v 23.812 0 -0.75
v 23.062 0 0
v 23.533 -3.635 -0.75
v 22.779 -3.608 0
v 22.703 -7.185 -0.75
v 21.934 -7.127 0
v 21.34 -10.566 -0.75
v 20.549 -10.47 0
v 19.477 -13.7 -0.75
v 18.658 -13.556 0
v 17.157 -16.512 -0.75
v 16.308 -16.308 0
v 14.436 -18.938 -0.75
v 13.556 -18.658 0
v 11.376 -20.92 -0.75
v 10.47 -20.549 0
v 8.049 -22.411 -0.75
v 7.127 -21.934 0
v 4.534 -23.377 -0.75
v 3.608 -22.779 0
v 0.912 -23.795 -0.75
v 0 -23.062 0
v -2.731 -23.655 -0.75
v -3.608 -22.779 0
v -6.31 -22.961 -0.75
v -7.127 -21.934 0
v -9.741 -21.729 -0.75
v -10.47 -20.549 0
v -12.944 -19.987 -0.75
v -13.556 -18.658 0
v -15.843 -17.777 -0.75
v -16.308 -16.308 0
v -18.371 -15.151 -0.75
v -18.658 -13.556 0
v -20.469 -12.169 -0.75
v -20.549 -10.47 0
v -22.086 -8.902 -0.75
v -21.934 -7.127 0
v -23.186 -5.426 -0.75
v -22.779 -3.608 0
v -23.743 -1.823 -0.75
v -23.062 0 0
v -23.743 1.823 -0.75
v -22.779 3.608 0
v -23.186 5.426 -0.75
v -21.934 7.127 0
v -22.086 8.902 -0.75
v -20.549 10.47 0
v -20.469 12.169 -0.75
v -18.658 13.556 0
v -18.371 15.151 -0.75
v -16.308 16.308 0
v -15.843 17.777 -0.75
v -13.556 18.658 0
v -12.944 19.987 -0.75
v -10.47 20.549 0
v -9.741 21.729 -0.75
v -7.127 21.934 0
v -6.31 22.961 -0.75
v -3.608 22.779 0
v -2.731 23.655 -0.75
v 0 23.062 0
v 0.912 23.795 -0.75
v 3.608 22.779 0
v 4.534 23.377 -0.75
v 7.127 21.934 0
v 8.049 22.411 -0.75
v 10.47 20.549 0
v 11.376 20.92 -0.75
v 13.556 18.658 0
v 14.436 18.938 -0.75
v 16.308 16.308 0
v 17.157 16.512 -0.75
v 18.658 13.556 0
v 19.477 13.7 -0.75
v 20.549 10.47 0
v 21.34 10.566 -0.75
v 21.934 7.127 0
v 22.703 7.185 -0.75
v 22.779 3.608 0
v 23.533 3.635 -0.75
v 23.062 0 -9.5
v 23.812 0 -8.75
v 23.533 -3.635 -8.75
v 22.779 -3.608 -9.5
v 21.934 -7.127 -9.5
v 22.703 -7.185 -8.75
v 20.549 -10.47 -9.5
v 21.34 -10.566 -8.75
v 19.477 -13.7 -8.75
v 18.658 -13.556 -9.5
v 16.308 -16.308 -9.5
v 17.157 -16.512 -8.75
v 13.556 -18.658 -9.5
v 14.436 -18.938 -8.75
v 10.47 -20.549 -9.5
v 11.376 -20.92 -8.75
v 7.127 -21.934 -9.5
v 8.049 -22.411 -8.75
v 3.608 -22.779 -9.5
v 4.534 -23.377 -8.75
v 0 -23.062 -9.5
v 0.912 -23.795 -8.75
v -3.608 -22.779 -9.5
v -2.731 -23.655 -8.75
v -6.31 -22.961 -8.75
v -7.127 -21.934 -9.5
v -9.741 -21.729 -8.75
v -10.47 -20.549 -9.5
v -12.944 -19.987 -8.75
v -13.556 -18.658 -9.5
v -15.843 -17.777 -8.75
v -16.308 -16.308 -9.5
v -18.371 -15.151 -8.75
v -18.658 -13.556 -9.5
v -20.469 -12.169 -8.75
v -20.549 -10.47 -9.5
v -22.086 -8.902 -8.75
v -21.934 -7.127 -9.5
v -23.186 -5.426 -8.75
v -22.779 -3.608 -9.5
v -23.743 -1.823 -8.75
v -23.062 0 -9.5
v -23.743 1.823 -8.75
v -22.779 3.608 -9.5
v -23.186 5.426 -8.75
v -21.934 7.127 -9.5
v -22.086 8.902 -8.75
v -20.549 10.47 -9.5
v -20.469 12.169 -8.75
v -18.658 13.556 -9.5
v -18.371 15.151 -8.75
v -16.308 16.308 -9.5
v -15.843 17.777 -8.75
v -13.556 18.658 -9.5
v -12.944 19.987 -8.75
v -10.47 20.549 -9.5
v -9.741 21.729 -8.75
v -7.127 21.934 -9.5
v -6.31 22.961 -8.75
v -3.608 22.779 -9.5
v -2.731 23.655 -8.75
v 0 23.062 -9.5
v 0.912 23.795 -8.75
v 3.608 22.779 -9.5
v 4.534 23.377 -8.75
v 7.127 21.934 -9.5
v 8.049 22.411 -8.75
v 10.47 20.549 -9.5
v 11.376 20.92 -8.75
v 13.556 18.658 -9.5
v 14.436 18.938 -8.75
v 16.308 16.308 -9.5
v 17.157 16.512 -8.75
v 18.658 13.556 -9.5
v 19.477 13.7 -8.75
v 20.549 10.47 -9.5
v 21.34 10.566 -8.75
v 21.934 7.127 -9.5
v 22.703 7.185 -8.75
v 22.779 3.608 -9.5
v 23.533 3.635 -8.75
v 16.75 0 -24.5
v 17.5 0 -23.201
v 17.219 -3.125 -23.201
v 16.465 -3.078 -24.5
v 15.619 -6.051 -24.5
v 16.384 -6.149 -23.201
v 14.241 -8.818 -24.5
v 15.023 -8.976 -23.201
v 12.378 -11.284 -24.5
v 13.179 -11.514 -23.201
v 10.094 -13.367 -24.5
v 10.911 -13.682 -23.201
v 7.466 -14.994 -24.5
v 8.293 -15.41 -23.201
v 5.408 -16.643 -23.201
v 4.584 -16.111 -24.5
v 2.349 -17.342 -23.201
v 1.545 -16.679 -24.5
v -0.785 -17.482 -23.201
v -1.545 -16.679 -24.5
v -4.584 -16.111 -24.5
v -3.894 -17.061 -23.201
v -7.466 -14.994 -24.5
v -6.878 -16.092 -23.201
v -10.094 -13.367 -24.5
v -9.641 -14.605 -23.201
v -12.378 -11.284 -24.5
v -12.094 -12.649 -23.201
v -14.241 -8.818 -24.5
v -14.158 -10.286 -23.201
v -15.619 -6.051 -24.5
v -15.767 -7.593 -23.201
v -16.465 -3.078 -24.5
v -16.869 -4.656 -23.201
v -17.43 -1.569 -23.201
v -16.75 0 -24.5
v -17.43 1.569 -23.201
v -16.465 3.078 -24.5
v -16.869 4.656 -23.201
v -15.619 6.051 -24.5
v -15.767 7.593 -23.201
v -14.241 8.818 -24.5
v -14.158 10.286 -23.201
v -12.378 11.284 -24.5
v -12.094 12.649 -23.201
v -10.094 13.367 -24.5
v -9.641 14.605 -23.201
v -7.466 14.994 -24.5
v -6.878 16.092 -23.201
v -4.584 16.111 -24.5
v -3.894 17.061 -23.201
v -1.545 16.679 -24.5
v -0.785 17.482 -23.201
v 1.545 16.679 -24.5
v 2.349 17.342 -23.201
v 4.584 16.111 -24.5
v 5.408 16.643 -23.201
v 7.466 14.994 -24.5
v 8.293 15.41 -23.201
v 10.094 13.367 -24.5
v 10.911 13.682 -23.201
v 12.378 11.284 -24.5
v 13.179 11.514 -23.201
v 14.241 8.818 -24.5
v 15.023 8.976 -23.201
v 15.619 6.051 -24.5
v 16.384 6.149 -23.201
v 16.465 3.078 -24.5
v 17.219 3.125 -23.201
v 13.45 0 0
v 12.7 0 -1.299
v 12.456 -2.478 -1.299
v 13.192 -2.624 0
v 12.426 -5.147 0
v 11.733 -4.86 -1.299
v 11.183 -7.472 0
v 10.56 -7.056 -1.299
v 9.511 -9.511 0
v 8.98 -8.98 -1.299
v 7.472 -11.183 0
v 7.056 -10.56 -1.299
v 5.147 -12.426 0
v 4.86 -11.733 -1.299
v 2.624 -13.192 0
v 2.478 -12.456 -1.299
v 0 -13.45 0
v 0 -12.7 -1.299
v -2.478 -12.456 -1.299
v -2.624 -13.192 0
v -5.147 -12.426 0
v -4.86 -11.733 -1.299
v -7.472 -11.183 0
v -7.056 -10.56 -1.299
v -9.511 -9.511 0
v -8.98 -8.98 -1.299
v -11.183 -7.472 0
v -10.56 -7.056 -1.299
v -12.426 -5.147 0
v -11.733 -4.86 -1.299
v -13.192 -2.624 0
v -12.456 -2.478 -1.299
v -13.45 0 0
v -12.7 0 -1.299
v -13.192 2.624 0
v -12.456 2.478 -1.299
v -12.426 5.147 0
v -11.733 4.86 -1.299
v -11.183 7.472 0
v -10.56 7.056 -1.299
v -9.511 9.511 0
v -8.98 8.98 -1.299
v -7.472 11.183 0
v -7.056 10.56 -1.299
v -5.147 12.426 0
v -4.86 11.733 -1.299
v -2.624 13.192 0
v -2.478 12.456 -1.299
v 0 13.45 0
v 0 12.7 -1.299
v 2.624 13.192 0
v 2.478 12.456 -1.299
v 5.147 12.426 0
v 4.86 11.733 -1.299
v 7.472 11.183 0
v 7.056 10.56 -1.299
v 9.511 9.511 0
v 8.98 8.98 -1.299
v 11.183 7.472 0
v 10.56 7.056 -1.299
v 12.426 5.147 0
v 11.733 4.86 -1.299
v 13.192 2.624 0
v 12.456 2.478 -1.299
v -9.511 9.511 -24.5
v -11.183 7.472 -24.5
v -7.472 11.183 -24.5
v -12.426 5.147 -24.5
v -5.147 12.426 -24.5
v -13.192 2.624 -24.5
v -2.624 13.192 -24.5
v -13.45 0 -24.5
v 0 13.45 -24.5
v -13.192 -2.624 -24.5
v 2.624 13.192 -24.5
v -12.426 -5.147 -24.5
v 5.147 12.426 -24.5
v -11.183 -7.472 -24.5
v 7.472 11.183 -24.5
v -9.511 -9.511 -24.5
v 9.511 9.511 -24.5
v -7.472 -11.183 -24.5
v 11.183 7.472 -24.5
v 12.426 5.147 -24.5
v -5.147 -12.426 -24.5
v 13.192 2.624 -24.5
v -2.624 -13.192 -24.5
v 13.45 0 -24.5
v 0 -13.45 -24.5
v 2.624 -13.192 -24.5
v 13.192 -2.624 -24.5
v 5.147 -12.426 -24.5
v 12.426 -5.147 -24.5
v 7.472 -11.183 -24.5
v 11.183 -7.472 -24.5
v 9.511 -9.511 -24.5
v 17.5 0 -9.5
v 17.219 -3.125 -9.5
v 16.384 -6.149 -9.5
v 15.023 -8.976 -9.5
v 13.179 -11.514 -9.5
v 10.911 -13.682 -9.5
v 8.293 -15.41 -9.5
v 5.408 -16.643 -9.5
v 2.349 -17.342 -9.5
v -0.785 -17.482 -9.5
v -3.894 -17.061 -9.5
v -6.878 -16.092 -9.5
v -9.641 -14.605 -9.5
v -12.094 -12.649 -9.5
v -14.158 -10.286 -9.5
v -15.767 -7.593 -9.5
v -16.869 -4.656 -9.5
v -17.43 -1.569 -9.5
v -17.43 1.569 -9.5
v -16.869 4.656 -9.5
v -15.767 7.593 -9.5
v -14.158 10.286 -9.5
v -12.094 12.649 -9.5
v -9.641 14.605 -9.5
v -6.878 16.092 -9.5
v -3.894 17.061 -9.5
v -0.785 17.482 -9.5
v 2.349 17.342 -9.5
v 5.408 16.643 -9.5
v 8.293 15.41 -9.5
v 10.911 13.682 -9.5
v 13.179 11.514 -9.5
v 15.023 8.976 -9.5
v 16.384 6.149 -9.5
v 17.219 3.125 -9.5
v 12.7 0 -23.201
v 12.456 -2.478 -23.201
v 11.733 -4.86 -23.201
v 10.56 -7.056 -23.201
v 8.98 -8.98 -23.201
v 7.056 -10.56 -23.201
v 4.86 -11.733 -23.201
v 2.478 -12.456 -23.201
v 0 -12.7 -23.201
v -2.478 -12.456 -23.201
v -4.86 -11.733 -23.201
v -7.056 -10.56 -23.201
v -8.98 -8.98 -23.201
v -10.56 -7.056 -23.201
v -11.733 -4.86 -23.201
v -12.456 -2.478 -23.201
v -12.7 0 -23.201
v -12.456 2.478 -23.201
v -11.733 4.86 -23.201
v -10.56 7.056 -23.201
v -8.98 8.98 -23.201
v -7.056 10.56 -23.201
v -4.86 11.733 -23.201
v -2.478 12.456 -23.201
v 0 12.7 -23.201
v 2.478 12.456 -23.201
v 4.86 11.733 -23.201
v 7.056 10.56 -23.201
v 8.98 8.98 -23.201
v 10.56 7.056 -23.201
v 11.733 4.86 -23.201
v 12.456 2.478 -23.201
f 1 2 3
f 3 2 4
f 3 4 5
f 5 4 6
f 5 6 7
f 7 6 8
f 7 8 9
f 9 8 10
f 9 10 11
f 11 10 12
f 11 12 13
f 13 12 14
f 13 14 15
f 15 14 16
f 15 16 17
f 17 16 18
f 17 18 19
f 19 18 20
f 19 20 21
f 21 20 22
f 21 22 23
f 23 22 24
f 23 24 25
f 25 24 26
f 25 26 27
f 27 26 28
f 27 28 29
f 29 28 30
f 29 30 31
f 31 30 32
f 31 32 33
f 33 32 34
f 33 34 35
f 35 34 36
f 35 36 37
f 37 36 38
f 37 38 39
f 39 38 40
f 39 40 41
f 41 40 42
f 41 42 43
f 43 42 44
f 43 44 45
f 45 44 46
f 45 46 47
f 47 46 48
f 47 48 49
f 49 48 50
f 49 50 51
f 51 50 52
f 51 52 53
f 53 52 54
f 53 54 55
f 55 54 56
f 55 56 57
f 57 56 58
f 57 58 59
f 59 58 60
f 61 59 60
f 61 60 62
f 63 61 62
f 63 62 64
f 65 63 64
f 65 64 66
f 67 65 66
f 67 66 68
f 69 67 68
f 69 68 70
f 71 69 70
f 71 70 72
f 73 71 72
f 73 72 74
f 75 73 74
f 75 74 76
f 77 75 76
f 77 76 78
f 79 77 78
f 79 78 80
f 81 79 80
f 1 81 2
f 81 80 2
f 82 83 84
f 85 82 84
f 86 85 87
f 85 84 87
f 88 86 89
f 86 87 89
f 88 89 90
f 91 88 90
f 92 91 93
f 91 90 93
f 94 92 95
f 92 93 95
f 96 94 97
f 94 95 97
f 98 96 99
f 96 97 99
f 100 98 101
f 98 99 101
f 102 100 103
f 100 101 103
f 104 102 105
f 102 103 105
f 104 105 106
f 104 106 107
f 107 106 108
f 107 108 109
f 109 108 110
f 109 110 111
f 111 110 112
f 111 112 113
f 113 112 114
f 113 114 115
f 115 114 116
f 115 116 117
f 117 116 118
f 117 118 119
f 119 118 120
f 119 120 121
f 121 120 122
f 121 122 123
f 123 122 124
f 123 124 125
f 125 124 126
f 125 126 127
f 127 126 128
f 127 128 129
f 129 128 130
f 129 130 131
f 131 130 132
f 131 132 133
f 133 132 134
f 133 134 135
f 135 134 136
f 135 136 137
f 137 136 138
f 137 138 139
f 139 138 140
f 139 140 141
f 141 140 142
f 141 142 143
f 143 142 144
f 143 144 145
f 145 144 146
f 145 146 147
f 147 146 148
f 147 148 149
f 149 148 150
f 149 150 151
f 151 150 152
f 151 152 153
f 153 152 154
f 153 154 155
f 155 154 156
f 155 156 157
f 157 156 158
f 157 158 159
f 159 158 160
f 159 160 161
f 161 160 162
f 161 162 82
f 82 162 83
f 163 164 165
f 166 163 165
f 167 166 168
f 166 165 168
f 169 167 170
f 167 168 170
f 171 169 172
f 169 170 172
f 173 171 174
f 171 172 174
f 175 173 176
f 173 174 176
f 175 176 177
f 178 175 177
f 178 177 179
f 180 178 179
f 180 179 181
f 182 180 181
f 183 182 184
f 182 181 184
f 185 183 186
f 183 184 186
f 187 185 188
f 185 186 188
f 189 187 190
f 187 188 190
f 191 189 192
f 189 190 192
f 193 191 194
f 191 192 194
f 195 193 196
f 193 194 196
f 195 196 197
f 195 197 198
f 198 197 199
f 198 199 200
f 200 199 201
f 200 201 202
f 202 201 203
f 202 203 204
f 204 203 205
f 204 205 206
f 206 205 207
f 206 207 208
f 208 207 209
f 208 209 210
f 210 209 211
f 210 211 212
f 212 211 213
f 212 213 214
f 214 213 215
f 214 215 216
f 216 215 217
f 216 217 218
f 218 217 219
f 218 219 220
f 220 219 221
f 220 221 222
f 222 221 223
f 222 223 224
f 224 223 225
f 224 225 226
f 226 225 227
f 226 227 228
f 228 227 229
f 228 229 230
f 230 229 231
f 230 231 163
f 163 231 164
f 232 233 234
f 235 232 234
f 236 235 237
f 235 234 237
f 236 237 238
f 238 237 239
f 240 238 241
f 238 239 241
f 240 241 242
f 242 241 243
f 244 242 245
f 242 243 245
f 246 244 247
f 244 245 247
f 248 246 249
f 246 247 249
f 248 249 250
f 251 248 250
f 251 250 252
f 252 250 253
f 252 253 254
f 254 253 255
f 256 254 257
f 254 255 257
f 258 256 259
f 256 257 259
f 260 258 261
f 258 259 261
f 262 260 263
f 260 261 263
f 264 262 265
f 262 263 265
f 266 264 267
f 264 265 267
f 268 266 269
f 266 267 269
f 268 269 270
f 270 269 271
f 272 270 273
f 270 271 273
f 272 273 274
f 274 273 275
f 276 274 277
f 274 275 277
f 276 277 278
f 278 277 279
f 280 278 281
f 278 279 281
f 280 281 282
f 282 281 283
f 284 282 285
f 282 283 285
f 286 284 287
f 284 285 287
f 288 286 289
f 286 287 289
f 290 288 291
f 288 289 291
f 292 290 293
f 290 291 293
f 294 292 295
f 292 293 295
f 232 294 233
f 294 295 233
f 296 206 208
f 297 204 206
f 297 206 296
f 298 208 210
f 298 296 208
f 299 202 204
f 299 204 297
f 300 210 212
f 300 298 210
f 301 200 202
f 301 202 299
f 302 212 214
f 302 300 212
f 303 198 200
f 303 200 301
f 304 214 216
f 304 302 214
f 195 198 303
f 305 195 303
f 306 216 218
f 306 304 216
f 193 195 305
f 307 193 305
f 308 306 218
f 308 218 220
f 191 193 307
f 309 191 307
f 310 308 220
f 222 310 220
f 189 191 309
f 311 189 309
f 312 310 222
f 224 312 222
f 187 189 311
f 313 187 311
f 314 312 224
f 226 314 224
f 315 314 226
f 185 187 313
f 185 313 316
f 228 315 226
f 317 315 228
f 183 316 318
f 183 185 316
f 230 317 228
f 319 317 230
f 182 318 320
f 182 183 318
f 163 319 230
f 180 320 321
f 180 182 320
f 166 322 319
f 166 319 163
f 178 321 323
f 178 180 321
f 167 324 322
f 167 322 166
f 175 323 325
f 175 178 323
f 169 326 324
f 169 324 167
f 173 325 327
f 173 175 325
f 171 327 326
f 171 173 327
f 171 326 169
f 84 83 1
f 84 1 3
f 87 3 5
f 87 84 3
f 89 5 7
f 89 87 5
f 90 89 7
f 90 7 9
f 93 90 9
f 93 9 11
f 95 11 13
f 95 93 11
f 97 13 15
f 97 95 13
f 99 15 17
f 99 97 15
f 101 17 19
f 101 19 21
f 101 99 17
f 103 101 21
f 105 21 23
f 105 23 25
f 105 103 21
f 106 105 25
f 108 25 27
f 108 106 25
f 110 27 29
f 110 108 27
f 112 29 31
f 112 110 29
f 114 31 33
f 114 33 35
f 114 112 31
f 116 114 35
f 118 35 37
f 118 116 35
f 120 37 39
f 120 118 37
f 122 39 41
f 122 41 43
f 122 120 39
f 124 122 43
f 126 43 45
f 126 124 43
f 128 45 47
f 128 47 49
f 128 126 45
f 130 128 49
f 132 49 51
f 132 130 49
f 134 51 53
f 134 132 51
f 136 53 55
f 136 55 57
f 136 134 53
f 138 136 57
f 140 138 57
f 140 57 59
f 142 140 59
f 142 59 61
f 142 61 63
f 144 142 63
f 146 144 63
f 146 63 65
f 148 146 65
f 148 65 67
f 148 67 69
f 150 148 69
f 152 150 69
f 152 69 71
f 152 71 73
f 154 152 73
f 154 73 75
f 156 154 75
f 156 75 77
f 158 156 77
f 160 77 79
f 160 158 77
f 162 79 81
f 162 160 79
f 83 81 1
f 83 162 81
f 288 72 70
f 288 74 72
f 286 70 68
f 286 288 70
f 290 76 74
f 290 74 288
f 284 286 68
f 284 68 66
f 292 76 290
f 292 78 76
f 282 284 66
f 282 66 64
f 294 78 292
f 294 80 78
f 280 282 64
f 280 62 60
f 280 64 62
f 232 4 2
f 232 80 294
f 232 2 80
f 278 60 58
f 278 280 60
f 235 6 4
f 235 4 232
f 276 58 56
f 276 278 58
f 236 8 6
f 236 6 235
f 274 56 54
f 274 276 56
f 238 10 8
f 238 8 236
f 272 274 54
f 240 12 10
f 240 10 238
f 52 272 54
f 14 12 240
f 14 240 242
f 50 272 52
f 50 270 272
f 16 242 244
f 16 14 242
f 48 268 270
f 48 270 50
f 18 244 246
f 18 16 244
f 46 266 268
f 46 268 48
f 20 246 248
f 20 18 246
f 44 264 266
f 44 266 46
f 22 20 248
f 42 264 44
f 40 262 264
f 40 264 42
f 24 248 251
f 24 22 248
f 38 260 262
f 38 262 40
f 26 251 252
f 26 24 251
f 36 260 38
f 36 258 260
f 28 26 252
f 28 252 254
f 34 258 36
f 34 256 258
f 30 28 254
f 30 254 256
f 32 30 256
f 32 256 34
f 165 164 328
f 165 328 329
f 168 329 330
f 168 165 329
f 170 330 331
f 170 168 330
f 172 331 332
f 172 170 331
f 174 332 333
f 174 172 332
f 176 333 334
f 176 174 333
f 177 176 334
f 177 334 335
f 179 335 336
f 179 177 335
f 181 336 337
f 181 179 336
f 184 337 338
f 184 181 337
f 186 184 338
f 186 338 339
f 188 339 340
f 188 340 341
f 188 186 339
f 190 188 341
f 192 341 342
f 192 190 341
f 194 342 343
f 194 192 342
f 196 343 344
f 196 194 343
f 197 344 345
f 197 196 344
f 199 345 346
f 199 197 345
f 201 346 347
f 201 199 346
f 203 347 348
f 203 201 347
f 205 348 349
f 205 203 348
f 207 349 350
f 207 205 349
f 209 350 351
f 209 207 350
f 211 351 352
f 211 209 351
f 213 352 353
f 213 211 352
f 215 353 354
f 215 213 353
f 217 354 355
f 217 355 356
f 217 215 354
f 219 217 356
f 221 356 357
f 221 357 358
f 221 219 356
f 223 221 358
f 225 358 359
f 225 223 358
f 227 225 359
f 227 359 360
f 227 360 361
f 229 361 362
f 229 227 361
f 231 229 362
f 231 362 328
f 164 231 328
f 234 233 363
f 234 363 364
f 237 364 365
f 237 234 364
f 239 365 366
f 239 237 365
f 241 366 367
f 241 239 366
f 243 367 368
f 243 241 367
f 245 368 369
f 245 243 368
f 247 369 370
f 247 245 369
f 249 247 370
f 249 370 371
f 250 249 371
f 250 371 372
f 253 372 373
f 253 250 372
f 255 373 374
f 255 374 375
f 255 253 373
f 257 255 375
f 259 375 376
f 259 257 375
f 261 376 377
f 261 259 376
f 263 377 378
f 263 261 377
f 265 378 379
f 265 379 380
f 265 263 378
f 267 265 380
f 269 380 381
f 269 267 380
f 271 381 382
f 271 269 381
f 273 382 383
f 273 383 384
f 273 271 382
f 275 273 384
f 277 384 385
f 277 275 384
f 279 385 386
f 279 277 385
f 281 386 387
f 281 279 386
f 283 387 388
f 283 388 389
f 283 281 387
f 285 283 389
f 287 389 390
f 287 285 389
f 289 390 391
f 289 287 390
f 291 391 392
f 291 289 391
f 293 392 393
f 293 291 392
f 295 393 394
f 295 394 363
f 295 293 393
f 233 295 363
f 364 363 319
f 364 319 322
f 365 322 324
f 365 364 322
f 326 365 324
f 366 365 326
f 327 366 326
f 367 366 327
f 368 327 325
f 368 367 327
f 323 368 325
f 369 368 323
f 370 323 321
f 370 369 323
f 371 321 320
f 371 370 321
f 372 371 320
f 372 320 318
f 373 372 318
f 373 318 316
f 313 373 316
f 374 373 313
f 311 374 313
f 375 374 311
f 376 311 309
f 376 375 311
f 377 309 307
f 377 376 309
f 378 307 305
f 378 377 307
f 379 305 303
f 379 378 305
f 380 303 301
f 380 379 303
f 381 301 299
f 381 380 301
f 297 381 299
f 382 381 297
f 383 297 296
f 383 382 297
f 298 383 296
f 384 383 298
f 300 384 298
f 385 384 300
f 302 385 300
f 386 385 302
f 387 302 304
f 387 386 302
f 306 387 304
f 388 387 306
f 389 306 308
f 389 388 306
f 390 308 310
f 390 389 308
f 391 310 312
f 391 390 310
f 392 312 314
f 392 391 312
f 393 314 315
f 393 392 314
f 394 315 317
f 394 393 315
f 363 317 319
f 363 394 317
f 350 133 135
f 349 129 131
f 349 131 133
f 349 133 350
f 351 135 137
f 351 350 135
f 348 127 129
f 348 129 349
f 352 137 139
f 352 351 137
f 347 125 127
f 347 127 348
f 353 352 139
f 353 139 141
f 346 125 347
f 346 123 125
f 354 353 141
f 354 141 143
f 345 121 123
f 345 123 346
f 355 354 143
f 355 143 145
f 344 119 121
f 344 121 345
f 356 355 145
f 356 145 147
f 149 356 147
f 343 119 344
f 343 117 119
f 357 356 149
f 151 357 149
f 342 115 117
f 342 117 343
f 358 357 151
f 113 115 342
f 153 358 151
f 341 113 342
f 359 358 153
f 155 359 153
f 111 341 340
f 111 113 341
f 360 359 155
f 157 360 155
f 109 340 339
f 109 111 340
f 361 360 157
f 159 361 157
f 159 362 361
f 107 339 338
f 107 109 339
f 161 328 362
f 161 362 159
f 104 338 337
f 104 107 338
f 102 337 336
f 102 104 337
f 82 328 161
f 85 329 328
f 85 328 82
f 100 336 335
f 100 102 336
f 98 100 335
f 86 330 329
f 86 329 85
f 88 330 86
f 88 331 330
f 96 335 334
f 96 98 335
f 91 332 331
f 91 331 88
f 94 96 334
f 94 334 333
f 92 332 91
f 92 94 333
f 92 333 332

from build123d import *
from OCP.BRepFilletAPI import BRepFilletAPI_MakeChamfer

# Parameters (mm, degrees)
CHAMFER1_SIZE  = 0.75
CHAMFER1_SIZE2 = 1.299038106
CHAMFER2_SIZE  = 0.75


with BuildPart() as part:
    # Sketch1 → Revolve1 (revolve)
    with BuildSketch(Plane(origin=(0, 0, 0), x_dir=(0, 0, -1), z_dir=(1, 0, 0))):
        Polygon((0, 23.8125), (9.5, 23.8125), (9.5, 17.5), (24.5, 17.5), (24.5, 12.7), (0, 12.7), align=None)
    revolve(axis=Axis((0, 0, 0), (0, 0, -1)))

    # Chamfer1: one chamfer whose edges measure the first distance from different faces: ONE call of the kernel's chamfer builder (chamfer() names one face for all edges)
    chamfer1_edges_1 = [part.edges().sort_by_distance(p)[0] for p in [
        (0, -17.5, -24.5),
        (0, -12.7, -24.5),
    ]]
    chamfer1_side_1 = [part.faces().sort_by_distance(p)[0] for p in [
        (0, -17.005025253, -24.5),
    ]]
    chamfer1_edges_2 = [part.edges().sort_by_distance(p)[0] for p in [
        (0, -12.7, 0),
    ]]
    chamfer1_side_2 = [part.faces().sort_by_distance(p)[0] for p in [
        (0, -13.373519209, 0),
    ]]
    chamfer1 = BRepFilletAPI_MakeChamfer(part.part.solid().wrapped)
    for e in chamfer1_edges_1:
        chamfer1.Add(CHAMFER1_SIZE, CHAMFER1_SIZE2, e.wrapped, chamfer1_side_1[0].wrapped)  # the first distance lies on this face
    for e in chamfer1_edges_2:
        chamfer1.Add(CHAMFER1_SIZE, CHAMFER1_SIZE2, e.wrapped, chamfer1_side_2[0].wrapped)  # the first distance lies on this face
    add(Compound.cast(chamfer1.Shape()), mode=Mode.REPLACE)

    # Chamfer2
    chamfer2_edges = [part.edges().sort_by_distance(p)[0] for p in [
        (0, -23.8125, -9.5),
        (0, -23.8125, 0),
    ]]
    chamfer(chamfer2_edges, length=CHAMFER2_SIZE)


solid = part.part
